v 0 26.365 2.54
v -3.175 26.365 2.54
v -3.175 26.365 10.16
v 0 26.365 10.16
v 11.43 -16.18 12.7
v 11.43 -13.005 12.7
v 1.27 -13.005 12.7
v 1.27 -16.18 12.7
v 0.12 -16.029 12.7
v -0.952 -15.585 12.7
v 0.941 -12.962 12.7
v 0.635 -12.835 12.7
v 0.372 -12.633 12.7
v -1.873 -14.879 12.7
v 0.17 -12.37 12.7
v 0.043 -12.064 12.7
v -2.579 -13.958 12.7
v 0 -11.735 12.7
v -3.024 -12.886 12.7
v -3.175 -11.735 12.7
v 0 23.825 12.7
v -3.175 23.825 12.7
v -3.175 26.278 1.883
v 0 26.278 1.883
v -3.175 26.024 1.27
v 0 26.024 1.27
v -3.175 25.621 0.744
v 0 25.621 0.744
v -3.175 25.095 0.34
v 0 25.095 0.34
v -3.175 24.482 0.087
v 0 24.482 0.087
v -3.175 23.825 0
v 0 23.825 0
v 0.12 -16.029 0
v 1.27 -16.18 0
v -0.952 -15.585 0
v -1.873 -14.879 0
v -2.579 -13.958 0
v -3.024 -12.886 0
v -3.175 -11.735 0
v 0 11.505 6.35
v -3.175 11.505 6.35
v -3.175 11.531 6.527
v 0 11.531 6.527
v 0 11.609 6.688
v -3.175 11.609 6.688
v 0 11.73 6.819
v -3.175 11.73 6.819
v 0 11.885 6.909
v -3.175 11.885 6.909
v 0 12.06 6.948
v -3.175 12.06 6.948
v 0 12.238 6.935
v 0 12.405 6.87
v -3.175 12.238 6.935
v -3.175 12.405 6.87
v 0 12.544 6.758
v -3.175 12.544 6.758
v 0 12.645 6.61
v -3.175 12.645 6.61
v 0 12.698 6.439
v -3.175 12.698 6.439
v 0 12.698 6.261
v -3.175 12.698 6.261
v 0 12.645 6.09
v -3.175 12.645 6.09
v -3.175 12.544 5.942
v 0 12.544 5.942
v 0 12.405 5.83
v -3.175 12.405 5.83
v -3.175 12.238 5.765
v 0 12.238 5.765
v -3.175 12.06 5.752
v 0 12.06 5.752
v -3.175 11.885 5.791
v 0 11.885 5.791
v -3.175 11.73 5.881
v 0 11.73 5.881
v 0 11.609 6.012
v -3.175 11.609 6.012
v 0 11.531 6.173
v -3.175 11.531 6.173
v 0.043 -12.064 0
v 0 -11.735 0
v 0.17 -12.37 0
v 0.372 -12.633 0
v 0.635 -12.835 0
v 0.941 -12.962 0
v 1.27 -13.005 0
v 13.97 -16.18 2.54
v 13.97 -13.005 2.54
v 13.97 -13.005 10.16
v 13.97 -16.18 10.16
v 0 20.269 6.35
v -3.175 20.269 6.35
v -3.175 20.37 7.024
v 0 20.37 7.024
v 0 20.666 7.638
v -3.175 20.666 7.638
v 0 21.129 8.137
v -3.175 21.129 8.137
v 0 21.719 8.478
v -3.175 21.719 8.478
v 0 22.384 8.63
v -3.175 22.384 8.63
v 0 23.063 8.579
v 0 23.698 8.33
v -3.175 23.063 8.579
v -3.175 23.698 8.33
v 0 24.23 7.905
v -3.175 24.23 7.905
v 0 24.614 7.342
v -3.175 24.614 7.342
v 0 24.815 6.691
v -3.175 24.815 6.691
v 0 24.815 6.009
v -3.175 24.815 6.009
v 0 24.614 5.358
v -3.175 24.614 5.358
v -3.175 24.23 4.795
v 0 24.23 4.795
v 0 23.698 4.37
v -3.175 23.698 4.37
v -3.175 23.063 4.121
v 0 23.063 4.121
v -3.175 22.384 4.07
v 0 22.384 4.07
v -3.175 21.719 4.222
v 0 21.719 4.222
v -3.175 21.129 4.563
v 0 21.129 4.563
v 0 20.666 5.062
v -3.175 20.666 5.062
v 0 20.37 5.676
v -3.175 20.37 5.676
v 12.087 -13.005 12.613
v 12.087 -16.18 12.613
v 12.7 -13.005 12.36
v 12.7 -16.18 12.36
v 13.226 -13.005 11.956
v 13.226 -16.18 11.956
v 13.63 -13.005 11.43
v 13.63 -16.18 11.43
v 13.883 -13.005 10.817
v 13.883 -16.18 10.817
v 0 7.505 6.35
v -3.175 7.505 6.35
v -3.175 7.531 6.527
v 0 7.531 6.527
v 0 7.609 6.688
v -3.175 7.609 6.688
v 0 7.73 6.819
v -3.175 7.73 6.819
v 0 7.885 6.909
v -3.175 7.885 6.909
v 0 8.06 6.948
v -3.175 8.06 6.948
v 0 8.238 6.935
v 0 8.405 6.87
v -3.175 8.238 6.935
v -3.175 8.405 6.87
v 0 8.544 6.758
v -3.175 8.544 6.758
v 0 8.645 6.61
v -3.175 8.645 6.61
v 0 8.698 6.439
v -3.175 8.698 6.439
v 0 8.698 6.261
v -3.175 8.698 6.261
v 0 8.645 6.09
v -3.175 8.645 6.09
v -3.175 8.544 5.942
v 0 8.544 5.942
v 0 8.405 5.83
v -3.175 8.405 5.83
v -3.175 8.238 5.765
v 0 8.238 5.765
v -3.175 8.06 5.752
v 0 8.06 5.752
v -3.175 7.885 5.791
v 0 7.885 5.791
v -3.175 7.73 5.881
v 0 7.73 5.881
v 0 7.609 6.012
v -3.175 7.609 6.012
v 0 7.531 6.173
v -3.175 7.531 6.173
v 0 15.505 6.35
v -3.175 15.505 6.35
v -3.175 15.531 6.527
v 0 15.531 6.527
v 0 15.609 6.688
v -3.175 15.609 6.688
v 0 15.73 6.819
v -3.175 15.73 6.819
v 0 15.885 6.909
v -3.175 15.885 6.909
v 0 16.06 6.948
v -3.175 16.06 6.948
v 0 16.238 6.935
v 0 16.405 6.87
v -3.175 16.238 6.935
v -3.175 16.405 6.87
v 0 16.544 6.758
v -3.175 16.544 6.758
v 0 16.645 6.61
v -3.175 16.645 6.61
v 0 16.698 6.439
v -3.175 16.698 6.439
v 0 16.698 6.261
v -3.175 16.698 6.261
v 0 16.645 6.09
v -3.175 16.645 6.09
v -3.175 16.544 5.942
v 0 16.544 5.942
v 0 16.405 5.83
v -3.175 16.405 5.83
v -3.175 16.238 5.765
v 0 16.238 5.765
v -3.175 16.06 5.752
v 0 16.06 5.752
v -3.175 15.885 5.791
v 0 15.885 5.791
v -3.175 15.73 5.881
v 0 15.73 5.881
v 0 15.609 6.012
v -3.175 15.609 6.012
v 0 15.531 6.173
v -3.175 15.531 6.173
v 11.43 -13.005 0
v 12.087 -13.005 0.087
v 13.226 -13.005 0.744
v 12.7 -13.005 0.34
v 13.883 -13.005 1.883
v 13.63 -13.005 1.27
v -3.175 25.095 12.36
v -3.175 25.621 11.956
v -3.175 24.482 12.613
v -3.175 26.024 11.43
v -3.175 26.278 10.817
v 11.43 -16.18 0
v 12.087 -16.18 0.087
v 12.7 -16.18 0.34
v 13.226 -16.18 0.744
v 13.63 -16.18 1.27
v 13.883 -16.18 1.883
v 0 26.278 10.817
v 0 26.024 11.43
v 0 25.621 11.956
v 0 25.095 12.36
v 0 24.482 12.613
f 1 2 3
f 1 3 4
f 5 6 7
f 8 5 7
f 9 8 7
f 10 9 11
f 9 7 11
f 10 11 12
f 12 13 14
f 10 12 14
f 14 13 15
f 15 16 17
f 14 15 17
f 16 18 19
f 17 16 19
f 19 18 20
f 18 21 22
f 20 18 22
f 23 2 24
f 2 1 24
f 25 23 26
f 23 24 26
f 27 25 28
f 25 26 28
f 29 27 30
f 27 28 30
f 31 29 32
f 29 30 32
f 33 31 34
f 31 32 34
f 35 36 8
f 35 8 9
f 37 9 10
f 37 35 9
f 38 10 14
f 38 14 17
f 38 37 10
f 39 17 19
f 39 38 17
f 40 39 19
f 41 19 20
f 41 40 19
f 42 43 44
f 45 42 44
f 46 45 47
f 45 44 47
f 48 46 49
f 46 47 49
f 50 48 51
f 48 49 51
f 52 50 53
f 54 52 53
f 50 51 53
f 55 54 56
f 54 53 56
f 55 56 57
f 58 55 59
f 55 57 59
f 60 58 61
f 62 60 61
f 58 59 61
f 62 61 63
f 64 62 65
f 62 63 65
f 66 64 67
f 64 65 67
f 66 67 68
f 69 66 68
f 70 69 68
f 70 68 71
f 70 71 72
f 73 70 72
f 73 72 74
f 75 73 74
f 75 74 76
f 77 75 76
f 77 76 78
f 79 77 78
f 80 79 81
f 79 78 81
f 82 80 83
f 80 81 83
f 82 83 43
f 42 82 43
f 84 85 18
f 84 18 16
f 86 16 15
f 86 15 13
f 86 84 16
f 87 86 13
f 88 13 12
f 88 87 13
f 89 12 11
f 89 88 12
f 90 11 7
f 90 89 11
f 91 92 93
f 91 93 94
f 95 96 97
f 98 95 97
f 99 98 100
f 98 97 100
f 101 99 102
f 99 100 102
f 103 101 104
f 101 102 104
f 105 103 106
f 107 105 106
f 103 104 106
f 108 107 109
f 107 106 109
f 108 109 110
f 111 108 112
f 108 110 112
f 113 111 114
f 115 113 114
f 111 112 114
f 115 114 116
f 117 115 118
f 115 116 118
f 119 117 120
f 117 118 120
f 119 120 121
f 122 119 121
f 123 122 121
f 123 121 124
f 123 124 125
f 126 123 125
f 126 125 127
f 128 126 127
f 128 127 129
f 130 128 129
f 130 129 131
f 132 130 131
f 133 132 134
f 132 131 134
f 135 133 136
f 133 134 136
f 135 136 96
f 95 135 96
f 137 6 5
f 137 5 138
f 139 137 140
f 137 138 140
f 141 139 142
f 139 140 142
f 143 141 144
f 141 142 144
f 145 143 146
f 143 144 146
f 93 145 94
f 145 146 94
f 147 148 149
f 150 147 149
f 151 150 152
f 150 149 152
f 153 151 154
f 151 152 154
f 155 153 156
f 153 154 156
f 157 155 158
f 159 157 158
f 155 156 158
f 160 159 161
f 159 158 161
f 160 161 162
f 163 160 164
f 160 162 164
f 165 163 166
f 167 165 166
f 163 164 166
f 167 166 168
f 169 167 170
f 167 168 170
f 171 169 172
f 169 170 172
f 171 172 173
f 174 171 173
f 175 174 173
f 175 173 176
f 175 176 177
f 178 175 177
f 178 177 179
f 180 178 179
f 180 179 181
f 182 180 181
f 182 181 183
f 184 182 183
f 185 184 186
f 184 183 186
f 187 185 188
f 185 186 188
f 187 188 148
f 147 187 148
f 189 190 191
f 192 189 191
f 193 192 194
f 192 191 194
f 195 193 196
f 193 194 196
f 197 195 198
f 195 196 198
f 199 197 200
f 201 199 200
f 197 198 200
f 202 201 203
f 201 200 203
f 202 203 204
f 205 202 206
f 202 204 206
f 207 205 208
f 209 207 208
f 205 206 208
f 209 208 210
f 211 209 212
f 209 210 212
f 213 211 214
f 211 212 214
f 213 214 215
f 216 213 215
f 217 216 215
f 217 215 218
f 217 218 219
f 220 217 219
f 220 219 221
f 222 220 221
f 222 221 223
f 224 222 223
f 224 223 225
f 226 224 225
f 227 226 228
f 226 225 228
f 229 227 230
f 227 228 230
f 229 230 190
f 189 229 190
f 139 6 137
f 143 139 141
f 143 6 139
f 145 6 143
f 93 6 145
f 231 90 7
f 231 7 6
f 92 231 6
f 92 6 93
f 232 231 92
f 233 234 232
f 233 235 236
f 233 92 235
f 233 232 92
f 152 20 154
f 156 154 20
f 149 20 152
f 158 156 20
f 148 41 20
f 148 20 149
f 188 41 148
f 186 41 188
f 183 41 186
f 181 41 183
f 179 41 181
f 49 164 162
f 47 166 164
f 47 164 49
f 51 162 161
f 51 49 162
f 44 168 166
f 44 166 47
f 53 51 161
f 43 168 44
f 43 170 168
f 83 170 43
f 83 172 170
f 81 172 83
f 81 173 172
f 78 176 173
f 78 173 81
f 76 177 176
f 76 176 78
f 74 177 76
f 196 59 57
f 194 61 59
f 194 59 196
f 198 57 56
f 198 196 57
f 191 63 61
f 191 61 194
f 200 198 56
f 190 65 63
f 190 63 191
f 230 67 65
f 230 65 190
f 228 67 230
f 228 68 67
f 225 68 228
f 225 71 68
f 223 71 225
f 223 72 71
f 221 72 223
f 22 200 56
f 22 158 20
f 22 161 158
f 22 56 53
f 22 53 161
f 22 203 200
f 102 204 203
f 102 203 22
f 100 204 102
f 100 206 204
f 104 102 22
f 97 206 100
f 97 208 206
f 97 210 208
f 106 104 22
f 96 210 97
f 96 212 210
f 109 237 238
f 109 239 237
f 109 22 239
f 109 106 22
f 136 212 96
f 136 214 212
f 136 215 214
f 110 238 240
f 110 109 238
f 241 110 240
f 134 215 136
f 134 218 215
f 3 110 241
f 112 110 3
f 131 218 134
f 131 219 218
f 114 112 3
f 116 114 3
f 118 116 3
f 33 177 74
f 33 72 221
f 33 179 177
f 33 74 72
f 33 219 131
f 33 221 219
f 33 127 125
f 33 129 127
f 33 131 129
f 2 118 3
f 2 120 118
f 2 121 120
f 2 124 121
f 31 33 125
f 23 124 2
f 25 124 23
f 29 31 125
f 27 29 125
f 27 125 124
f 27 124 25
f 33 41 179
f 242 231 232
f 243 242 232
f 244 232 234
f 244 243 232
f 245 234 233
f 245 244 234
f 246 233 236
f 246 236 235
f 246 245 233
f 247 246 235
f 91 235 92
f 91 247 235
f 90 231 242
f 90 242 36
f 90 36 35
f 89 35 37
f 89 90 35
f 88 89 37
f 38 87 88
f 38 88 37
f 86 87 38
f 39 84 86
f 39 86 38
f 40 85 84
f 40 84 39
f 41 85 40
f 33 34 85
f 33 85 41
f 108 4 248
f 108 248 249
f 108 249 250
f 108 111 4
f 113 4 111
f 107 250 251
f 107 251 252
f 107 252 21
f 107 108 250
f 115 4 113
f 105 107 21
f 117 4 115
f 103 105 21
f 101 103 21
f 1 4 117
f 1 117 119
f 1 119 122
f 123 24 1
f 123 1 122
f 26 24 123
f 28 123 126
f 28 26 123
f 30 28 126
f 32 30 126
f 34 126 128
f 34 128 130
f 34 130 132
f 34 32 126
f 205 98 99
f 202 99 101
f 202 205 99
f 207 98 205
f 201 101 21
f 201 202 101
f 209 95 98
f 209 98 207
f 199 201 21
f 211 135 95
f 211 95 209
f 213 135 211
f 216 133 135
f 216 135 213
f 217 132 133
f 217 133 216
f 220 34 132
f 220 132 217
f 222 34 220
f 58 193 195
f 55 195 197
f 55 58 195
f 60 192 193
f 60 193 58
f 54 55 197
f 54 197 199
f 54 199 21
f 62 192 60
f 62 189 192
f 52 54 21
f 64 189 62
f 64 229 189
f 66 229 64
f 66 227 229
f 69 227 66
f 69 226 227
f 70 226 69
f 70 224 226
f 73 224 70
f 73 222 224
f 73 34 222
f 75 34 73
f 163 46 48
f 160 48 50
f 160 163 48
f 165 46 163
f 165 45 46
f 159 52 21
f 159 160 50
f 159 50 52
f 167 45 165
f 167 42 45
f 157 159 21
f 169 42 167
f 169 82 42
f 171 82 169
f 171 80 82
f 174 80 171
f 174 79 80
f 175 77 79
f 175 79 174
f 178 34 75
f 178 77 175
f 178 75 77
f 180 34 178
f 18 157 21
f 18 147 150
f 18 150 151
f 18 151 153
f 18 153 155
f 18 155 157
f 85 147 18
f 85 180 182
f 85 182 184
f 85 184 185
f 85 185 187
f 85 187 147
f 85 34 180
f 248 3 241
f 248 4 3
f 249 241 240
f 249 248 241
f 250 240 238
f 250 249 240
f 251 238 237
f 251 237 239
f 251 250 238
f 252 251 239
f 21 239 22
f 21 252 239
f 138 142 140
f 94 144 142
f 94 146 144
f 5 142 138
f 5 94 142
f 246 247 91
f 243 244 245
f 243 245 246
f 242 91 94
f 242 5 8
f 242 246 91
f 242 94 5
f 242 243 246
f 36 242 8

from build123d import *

# Parameters (mm, degrees)
BOSS_EXTRUDE1_DEPTH = 12.7
CUT_EXTRUDE1_REACH  = 35.917
SKETCH2_R           = 2.286
SKETCH2_R_2         = 0.6
FILLET1_R           = 2.54


with BuildPart() as part:
    # Sketch1 → Boss-Extrude1 (new body)
    with BuildSketch(Plane.XY):
        with BuildLine():
            Line((0, 26.364540169), (0, -11.735459831))
            ThreePointArc((0, -11.735459831), (0.371974388, -12.633485443), (1.27, -13.005459831))
            Line((1.27, -13.005459831), (13.97, -13.005459831))
            Line((13.97, -13.005459831), (13.97, -16.180459831))
            Line((13.97, -16.180459831), (1.27, -16.180459831))
            ThreePointArc((1.27, -16.180459831), (-1.873089642, -14.878549473), (-3.175, -11.735459831))
            Line((-3.175, -11.735459831), (-3.175, 26.364540169))
            Line((-3.175, 26.364540169), (0, 26.364540169))
        make_face()
    extrude(amount=BOSS_EXTRUDE1_DEPTH)

    # Sketch2 → Cut-Extrude1 (cut, up to next)
    with BuildSketch(Plane.ZY.offset(3.175), mode=Mode.PRIVATE) as cut_extrude1_sk1:
        with Locations((6.35, 22.554540169)):
            Circle(SKETCH2_R)
    cut_extrude1_tool1 = extrude(cut_extrude1_sk1.sketch, amount=-CUT_EXTRUDE1_REACH, mode=Mode.PRIVATE) & part.part
    # Sketch2 → Cut-Extrude1 (cut, up to next)
    with BuildSketch(Plane.ZY.offset(3.175), mode=Mode.PRIVATE) as cut_extrude1_sk2:
        with Locations((6.35, 16.104540169)):
            Circle(SKETCH2_R_2)
    cut_extrude1_tool2 = extrude(cut_extrude1_sk2.sketch, amount=-CUT_EXTRUDE1_REACH, mode=Mode.PRIVATE) & part.part
    # Sketch2 → Cut-Extrude1 (cut, up to next)
    with BuildSketch(Plane.ZY.offset(3.175), mode=Mode.PRIVATE) as cut_extrude1_sk3:
        with Locations((6.35, 12.104540169)):
            Circle(SKETCH2_R_2)
    cut_extrude1_tool3 = extrude(cut_extrude1_sk3.sketch, amount=-CUT_EXTRUDE1_REACH, mode=Mode.PRIVATE) & part.part
    # Sketch2 → Cut-Extrude1 (cut, up to next)
    with BuildSketch(Plane.ZY.offset(3.175), mode=Mode.PRIVATE) as cut_extrude1_sk4:
        with Locations((6.35, 8.104540169)):
            Circle(SKETCH2_R_2)
    cut_extrude1_tool4 = extrude(cut_extrude1_sk4.sketch, amount=-CUT_EXTRUDE1_REACH, mode=Mode.PRIVATE) & part.part
    add(cut_extrude1_tool1.solids().sort_by_distance((-3.175, 22.55454, 6.35))[0], mode=Mode.SUBTRACT)
    add(cut_extrude1_tool2.solids().sort_by_distance((-3.175, 16.10454, 6.35))[0], mode=Mode.SUBTRACT)
    add(cut_extrude1_tool3.solids().sort_by_distance((-3.175, 12.10454, 6.35))[0], mode=Mode.SUBTRACT)
    add(cut_extrude1_tool4.solids().sort_by_distance((-3.175, 8.10454, 6.35))[0], mode=Mode.SUBTRACT)

    # Fillet1
    fillet1_edges = [part.edges().sort_by_distance(p)[0] for p in [
        (13.97, -14.592959831, 0),
        (13.97, -14.592959831, 12.7),
        (-1.5875, 26.364540169, 0),
        (-1.5875, 26.364540169, 12.7),
    ]]
    fillet(fillet1_edges, radius=FILLET1_R)


solid = part.part
